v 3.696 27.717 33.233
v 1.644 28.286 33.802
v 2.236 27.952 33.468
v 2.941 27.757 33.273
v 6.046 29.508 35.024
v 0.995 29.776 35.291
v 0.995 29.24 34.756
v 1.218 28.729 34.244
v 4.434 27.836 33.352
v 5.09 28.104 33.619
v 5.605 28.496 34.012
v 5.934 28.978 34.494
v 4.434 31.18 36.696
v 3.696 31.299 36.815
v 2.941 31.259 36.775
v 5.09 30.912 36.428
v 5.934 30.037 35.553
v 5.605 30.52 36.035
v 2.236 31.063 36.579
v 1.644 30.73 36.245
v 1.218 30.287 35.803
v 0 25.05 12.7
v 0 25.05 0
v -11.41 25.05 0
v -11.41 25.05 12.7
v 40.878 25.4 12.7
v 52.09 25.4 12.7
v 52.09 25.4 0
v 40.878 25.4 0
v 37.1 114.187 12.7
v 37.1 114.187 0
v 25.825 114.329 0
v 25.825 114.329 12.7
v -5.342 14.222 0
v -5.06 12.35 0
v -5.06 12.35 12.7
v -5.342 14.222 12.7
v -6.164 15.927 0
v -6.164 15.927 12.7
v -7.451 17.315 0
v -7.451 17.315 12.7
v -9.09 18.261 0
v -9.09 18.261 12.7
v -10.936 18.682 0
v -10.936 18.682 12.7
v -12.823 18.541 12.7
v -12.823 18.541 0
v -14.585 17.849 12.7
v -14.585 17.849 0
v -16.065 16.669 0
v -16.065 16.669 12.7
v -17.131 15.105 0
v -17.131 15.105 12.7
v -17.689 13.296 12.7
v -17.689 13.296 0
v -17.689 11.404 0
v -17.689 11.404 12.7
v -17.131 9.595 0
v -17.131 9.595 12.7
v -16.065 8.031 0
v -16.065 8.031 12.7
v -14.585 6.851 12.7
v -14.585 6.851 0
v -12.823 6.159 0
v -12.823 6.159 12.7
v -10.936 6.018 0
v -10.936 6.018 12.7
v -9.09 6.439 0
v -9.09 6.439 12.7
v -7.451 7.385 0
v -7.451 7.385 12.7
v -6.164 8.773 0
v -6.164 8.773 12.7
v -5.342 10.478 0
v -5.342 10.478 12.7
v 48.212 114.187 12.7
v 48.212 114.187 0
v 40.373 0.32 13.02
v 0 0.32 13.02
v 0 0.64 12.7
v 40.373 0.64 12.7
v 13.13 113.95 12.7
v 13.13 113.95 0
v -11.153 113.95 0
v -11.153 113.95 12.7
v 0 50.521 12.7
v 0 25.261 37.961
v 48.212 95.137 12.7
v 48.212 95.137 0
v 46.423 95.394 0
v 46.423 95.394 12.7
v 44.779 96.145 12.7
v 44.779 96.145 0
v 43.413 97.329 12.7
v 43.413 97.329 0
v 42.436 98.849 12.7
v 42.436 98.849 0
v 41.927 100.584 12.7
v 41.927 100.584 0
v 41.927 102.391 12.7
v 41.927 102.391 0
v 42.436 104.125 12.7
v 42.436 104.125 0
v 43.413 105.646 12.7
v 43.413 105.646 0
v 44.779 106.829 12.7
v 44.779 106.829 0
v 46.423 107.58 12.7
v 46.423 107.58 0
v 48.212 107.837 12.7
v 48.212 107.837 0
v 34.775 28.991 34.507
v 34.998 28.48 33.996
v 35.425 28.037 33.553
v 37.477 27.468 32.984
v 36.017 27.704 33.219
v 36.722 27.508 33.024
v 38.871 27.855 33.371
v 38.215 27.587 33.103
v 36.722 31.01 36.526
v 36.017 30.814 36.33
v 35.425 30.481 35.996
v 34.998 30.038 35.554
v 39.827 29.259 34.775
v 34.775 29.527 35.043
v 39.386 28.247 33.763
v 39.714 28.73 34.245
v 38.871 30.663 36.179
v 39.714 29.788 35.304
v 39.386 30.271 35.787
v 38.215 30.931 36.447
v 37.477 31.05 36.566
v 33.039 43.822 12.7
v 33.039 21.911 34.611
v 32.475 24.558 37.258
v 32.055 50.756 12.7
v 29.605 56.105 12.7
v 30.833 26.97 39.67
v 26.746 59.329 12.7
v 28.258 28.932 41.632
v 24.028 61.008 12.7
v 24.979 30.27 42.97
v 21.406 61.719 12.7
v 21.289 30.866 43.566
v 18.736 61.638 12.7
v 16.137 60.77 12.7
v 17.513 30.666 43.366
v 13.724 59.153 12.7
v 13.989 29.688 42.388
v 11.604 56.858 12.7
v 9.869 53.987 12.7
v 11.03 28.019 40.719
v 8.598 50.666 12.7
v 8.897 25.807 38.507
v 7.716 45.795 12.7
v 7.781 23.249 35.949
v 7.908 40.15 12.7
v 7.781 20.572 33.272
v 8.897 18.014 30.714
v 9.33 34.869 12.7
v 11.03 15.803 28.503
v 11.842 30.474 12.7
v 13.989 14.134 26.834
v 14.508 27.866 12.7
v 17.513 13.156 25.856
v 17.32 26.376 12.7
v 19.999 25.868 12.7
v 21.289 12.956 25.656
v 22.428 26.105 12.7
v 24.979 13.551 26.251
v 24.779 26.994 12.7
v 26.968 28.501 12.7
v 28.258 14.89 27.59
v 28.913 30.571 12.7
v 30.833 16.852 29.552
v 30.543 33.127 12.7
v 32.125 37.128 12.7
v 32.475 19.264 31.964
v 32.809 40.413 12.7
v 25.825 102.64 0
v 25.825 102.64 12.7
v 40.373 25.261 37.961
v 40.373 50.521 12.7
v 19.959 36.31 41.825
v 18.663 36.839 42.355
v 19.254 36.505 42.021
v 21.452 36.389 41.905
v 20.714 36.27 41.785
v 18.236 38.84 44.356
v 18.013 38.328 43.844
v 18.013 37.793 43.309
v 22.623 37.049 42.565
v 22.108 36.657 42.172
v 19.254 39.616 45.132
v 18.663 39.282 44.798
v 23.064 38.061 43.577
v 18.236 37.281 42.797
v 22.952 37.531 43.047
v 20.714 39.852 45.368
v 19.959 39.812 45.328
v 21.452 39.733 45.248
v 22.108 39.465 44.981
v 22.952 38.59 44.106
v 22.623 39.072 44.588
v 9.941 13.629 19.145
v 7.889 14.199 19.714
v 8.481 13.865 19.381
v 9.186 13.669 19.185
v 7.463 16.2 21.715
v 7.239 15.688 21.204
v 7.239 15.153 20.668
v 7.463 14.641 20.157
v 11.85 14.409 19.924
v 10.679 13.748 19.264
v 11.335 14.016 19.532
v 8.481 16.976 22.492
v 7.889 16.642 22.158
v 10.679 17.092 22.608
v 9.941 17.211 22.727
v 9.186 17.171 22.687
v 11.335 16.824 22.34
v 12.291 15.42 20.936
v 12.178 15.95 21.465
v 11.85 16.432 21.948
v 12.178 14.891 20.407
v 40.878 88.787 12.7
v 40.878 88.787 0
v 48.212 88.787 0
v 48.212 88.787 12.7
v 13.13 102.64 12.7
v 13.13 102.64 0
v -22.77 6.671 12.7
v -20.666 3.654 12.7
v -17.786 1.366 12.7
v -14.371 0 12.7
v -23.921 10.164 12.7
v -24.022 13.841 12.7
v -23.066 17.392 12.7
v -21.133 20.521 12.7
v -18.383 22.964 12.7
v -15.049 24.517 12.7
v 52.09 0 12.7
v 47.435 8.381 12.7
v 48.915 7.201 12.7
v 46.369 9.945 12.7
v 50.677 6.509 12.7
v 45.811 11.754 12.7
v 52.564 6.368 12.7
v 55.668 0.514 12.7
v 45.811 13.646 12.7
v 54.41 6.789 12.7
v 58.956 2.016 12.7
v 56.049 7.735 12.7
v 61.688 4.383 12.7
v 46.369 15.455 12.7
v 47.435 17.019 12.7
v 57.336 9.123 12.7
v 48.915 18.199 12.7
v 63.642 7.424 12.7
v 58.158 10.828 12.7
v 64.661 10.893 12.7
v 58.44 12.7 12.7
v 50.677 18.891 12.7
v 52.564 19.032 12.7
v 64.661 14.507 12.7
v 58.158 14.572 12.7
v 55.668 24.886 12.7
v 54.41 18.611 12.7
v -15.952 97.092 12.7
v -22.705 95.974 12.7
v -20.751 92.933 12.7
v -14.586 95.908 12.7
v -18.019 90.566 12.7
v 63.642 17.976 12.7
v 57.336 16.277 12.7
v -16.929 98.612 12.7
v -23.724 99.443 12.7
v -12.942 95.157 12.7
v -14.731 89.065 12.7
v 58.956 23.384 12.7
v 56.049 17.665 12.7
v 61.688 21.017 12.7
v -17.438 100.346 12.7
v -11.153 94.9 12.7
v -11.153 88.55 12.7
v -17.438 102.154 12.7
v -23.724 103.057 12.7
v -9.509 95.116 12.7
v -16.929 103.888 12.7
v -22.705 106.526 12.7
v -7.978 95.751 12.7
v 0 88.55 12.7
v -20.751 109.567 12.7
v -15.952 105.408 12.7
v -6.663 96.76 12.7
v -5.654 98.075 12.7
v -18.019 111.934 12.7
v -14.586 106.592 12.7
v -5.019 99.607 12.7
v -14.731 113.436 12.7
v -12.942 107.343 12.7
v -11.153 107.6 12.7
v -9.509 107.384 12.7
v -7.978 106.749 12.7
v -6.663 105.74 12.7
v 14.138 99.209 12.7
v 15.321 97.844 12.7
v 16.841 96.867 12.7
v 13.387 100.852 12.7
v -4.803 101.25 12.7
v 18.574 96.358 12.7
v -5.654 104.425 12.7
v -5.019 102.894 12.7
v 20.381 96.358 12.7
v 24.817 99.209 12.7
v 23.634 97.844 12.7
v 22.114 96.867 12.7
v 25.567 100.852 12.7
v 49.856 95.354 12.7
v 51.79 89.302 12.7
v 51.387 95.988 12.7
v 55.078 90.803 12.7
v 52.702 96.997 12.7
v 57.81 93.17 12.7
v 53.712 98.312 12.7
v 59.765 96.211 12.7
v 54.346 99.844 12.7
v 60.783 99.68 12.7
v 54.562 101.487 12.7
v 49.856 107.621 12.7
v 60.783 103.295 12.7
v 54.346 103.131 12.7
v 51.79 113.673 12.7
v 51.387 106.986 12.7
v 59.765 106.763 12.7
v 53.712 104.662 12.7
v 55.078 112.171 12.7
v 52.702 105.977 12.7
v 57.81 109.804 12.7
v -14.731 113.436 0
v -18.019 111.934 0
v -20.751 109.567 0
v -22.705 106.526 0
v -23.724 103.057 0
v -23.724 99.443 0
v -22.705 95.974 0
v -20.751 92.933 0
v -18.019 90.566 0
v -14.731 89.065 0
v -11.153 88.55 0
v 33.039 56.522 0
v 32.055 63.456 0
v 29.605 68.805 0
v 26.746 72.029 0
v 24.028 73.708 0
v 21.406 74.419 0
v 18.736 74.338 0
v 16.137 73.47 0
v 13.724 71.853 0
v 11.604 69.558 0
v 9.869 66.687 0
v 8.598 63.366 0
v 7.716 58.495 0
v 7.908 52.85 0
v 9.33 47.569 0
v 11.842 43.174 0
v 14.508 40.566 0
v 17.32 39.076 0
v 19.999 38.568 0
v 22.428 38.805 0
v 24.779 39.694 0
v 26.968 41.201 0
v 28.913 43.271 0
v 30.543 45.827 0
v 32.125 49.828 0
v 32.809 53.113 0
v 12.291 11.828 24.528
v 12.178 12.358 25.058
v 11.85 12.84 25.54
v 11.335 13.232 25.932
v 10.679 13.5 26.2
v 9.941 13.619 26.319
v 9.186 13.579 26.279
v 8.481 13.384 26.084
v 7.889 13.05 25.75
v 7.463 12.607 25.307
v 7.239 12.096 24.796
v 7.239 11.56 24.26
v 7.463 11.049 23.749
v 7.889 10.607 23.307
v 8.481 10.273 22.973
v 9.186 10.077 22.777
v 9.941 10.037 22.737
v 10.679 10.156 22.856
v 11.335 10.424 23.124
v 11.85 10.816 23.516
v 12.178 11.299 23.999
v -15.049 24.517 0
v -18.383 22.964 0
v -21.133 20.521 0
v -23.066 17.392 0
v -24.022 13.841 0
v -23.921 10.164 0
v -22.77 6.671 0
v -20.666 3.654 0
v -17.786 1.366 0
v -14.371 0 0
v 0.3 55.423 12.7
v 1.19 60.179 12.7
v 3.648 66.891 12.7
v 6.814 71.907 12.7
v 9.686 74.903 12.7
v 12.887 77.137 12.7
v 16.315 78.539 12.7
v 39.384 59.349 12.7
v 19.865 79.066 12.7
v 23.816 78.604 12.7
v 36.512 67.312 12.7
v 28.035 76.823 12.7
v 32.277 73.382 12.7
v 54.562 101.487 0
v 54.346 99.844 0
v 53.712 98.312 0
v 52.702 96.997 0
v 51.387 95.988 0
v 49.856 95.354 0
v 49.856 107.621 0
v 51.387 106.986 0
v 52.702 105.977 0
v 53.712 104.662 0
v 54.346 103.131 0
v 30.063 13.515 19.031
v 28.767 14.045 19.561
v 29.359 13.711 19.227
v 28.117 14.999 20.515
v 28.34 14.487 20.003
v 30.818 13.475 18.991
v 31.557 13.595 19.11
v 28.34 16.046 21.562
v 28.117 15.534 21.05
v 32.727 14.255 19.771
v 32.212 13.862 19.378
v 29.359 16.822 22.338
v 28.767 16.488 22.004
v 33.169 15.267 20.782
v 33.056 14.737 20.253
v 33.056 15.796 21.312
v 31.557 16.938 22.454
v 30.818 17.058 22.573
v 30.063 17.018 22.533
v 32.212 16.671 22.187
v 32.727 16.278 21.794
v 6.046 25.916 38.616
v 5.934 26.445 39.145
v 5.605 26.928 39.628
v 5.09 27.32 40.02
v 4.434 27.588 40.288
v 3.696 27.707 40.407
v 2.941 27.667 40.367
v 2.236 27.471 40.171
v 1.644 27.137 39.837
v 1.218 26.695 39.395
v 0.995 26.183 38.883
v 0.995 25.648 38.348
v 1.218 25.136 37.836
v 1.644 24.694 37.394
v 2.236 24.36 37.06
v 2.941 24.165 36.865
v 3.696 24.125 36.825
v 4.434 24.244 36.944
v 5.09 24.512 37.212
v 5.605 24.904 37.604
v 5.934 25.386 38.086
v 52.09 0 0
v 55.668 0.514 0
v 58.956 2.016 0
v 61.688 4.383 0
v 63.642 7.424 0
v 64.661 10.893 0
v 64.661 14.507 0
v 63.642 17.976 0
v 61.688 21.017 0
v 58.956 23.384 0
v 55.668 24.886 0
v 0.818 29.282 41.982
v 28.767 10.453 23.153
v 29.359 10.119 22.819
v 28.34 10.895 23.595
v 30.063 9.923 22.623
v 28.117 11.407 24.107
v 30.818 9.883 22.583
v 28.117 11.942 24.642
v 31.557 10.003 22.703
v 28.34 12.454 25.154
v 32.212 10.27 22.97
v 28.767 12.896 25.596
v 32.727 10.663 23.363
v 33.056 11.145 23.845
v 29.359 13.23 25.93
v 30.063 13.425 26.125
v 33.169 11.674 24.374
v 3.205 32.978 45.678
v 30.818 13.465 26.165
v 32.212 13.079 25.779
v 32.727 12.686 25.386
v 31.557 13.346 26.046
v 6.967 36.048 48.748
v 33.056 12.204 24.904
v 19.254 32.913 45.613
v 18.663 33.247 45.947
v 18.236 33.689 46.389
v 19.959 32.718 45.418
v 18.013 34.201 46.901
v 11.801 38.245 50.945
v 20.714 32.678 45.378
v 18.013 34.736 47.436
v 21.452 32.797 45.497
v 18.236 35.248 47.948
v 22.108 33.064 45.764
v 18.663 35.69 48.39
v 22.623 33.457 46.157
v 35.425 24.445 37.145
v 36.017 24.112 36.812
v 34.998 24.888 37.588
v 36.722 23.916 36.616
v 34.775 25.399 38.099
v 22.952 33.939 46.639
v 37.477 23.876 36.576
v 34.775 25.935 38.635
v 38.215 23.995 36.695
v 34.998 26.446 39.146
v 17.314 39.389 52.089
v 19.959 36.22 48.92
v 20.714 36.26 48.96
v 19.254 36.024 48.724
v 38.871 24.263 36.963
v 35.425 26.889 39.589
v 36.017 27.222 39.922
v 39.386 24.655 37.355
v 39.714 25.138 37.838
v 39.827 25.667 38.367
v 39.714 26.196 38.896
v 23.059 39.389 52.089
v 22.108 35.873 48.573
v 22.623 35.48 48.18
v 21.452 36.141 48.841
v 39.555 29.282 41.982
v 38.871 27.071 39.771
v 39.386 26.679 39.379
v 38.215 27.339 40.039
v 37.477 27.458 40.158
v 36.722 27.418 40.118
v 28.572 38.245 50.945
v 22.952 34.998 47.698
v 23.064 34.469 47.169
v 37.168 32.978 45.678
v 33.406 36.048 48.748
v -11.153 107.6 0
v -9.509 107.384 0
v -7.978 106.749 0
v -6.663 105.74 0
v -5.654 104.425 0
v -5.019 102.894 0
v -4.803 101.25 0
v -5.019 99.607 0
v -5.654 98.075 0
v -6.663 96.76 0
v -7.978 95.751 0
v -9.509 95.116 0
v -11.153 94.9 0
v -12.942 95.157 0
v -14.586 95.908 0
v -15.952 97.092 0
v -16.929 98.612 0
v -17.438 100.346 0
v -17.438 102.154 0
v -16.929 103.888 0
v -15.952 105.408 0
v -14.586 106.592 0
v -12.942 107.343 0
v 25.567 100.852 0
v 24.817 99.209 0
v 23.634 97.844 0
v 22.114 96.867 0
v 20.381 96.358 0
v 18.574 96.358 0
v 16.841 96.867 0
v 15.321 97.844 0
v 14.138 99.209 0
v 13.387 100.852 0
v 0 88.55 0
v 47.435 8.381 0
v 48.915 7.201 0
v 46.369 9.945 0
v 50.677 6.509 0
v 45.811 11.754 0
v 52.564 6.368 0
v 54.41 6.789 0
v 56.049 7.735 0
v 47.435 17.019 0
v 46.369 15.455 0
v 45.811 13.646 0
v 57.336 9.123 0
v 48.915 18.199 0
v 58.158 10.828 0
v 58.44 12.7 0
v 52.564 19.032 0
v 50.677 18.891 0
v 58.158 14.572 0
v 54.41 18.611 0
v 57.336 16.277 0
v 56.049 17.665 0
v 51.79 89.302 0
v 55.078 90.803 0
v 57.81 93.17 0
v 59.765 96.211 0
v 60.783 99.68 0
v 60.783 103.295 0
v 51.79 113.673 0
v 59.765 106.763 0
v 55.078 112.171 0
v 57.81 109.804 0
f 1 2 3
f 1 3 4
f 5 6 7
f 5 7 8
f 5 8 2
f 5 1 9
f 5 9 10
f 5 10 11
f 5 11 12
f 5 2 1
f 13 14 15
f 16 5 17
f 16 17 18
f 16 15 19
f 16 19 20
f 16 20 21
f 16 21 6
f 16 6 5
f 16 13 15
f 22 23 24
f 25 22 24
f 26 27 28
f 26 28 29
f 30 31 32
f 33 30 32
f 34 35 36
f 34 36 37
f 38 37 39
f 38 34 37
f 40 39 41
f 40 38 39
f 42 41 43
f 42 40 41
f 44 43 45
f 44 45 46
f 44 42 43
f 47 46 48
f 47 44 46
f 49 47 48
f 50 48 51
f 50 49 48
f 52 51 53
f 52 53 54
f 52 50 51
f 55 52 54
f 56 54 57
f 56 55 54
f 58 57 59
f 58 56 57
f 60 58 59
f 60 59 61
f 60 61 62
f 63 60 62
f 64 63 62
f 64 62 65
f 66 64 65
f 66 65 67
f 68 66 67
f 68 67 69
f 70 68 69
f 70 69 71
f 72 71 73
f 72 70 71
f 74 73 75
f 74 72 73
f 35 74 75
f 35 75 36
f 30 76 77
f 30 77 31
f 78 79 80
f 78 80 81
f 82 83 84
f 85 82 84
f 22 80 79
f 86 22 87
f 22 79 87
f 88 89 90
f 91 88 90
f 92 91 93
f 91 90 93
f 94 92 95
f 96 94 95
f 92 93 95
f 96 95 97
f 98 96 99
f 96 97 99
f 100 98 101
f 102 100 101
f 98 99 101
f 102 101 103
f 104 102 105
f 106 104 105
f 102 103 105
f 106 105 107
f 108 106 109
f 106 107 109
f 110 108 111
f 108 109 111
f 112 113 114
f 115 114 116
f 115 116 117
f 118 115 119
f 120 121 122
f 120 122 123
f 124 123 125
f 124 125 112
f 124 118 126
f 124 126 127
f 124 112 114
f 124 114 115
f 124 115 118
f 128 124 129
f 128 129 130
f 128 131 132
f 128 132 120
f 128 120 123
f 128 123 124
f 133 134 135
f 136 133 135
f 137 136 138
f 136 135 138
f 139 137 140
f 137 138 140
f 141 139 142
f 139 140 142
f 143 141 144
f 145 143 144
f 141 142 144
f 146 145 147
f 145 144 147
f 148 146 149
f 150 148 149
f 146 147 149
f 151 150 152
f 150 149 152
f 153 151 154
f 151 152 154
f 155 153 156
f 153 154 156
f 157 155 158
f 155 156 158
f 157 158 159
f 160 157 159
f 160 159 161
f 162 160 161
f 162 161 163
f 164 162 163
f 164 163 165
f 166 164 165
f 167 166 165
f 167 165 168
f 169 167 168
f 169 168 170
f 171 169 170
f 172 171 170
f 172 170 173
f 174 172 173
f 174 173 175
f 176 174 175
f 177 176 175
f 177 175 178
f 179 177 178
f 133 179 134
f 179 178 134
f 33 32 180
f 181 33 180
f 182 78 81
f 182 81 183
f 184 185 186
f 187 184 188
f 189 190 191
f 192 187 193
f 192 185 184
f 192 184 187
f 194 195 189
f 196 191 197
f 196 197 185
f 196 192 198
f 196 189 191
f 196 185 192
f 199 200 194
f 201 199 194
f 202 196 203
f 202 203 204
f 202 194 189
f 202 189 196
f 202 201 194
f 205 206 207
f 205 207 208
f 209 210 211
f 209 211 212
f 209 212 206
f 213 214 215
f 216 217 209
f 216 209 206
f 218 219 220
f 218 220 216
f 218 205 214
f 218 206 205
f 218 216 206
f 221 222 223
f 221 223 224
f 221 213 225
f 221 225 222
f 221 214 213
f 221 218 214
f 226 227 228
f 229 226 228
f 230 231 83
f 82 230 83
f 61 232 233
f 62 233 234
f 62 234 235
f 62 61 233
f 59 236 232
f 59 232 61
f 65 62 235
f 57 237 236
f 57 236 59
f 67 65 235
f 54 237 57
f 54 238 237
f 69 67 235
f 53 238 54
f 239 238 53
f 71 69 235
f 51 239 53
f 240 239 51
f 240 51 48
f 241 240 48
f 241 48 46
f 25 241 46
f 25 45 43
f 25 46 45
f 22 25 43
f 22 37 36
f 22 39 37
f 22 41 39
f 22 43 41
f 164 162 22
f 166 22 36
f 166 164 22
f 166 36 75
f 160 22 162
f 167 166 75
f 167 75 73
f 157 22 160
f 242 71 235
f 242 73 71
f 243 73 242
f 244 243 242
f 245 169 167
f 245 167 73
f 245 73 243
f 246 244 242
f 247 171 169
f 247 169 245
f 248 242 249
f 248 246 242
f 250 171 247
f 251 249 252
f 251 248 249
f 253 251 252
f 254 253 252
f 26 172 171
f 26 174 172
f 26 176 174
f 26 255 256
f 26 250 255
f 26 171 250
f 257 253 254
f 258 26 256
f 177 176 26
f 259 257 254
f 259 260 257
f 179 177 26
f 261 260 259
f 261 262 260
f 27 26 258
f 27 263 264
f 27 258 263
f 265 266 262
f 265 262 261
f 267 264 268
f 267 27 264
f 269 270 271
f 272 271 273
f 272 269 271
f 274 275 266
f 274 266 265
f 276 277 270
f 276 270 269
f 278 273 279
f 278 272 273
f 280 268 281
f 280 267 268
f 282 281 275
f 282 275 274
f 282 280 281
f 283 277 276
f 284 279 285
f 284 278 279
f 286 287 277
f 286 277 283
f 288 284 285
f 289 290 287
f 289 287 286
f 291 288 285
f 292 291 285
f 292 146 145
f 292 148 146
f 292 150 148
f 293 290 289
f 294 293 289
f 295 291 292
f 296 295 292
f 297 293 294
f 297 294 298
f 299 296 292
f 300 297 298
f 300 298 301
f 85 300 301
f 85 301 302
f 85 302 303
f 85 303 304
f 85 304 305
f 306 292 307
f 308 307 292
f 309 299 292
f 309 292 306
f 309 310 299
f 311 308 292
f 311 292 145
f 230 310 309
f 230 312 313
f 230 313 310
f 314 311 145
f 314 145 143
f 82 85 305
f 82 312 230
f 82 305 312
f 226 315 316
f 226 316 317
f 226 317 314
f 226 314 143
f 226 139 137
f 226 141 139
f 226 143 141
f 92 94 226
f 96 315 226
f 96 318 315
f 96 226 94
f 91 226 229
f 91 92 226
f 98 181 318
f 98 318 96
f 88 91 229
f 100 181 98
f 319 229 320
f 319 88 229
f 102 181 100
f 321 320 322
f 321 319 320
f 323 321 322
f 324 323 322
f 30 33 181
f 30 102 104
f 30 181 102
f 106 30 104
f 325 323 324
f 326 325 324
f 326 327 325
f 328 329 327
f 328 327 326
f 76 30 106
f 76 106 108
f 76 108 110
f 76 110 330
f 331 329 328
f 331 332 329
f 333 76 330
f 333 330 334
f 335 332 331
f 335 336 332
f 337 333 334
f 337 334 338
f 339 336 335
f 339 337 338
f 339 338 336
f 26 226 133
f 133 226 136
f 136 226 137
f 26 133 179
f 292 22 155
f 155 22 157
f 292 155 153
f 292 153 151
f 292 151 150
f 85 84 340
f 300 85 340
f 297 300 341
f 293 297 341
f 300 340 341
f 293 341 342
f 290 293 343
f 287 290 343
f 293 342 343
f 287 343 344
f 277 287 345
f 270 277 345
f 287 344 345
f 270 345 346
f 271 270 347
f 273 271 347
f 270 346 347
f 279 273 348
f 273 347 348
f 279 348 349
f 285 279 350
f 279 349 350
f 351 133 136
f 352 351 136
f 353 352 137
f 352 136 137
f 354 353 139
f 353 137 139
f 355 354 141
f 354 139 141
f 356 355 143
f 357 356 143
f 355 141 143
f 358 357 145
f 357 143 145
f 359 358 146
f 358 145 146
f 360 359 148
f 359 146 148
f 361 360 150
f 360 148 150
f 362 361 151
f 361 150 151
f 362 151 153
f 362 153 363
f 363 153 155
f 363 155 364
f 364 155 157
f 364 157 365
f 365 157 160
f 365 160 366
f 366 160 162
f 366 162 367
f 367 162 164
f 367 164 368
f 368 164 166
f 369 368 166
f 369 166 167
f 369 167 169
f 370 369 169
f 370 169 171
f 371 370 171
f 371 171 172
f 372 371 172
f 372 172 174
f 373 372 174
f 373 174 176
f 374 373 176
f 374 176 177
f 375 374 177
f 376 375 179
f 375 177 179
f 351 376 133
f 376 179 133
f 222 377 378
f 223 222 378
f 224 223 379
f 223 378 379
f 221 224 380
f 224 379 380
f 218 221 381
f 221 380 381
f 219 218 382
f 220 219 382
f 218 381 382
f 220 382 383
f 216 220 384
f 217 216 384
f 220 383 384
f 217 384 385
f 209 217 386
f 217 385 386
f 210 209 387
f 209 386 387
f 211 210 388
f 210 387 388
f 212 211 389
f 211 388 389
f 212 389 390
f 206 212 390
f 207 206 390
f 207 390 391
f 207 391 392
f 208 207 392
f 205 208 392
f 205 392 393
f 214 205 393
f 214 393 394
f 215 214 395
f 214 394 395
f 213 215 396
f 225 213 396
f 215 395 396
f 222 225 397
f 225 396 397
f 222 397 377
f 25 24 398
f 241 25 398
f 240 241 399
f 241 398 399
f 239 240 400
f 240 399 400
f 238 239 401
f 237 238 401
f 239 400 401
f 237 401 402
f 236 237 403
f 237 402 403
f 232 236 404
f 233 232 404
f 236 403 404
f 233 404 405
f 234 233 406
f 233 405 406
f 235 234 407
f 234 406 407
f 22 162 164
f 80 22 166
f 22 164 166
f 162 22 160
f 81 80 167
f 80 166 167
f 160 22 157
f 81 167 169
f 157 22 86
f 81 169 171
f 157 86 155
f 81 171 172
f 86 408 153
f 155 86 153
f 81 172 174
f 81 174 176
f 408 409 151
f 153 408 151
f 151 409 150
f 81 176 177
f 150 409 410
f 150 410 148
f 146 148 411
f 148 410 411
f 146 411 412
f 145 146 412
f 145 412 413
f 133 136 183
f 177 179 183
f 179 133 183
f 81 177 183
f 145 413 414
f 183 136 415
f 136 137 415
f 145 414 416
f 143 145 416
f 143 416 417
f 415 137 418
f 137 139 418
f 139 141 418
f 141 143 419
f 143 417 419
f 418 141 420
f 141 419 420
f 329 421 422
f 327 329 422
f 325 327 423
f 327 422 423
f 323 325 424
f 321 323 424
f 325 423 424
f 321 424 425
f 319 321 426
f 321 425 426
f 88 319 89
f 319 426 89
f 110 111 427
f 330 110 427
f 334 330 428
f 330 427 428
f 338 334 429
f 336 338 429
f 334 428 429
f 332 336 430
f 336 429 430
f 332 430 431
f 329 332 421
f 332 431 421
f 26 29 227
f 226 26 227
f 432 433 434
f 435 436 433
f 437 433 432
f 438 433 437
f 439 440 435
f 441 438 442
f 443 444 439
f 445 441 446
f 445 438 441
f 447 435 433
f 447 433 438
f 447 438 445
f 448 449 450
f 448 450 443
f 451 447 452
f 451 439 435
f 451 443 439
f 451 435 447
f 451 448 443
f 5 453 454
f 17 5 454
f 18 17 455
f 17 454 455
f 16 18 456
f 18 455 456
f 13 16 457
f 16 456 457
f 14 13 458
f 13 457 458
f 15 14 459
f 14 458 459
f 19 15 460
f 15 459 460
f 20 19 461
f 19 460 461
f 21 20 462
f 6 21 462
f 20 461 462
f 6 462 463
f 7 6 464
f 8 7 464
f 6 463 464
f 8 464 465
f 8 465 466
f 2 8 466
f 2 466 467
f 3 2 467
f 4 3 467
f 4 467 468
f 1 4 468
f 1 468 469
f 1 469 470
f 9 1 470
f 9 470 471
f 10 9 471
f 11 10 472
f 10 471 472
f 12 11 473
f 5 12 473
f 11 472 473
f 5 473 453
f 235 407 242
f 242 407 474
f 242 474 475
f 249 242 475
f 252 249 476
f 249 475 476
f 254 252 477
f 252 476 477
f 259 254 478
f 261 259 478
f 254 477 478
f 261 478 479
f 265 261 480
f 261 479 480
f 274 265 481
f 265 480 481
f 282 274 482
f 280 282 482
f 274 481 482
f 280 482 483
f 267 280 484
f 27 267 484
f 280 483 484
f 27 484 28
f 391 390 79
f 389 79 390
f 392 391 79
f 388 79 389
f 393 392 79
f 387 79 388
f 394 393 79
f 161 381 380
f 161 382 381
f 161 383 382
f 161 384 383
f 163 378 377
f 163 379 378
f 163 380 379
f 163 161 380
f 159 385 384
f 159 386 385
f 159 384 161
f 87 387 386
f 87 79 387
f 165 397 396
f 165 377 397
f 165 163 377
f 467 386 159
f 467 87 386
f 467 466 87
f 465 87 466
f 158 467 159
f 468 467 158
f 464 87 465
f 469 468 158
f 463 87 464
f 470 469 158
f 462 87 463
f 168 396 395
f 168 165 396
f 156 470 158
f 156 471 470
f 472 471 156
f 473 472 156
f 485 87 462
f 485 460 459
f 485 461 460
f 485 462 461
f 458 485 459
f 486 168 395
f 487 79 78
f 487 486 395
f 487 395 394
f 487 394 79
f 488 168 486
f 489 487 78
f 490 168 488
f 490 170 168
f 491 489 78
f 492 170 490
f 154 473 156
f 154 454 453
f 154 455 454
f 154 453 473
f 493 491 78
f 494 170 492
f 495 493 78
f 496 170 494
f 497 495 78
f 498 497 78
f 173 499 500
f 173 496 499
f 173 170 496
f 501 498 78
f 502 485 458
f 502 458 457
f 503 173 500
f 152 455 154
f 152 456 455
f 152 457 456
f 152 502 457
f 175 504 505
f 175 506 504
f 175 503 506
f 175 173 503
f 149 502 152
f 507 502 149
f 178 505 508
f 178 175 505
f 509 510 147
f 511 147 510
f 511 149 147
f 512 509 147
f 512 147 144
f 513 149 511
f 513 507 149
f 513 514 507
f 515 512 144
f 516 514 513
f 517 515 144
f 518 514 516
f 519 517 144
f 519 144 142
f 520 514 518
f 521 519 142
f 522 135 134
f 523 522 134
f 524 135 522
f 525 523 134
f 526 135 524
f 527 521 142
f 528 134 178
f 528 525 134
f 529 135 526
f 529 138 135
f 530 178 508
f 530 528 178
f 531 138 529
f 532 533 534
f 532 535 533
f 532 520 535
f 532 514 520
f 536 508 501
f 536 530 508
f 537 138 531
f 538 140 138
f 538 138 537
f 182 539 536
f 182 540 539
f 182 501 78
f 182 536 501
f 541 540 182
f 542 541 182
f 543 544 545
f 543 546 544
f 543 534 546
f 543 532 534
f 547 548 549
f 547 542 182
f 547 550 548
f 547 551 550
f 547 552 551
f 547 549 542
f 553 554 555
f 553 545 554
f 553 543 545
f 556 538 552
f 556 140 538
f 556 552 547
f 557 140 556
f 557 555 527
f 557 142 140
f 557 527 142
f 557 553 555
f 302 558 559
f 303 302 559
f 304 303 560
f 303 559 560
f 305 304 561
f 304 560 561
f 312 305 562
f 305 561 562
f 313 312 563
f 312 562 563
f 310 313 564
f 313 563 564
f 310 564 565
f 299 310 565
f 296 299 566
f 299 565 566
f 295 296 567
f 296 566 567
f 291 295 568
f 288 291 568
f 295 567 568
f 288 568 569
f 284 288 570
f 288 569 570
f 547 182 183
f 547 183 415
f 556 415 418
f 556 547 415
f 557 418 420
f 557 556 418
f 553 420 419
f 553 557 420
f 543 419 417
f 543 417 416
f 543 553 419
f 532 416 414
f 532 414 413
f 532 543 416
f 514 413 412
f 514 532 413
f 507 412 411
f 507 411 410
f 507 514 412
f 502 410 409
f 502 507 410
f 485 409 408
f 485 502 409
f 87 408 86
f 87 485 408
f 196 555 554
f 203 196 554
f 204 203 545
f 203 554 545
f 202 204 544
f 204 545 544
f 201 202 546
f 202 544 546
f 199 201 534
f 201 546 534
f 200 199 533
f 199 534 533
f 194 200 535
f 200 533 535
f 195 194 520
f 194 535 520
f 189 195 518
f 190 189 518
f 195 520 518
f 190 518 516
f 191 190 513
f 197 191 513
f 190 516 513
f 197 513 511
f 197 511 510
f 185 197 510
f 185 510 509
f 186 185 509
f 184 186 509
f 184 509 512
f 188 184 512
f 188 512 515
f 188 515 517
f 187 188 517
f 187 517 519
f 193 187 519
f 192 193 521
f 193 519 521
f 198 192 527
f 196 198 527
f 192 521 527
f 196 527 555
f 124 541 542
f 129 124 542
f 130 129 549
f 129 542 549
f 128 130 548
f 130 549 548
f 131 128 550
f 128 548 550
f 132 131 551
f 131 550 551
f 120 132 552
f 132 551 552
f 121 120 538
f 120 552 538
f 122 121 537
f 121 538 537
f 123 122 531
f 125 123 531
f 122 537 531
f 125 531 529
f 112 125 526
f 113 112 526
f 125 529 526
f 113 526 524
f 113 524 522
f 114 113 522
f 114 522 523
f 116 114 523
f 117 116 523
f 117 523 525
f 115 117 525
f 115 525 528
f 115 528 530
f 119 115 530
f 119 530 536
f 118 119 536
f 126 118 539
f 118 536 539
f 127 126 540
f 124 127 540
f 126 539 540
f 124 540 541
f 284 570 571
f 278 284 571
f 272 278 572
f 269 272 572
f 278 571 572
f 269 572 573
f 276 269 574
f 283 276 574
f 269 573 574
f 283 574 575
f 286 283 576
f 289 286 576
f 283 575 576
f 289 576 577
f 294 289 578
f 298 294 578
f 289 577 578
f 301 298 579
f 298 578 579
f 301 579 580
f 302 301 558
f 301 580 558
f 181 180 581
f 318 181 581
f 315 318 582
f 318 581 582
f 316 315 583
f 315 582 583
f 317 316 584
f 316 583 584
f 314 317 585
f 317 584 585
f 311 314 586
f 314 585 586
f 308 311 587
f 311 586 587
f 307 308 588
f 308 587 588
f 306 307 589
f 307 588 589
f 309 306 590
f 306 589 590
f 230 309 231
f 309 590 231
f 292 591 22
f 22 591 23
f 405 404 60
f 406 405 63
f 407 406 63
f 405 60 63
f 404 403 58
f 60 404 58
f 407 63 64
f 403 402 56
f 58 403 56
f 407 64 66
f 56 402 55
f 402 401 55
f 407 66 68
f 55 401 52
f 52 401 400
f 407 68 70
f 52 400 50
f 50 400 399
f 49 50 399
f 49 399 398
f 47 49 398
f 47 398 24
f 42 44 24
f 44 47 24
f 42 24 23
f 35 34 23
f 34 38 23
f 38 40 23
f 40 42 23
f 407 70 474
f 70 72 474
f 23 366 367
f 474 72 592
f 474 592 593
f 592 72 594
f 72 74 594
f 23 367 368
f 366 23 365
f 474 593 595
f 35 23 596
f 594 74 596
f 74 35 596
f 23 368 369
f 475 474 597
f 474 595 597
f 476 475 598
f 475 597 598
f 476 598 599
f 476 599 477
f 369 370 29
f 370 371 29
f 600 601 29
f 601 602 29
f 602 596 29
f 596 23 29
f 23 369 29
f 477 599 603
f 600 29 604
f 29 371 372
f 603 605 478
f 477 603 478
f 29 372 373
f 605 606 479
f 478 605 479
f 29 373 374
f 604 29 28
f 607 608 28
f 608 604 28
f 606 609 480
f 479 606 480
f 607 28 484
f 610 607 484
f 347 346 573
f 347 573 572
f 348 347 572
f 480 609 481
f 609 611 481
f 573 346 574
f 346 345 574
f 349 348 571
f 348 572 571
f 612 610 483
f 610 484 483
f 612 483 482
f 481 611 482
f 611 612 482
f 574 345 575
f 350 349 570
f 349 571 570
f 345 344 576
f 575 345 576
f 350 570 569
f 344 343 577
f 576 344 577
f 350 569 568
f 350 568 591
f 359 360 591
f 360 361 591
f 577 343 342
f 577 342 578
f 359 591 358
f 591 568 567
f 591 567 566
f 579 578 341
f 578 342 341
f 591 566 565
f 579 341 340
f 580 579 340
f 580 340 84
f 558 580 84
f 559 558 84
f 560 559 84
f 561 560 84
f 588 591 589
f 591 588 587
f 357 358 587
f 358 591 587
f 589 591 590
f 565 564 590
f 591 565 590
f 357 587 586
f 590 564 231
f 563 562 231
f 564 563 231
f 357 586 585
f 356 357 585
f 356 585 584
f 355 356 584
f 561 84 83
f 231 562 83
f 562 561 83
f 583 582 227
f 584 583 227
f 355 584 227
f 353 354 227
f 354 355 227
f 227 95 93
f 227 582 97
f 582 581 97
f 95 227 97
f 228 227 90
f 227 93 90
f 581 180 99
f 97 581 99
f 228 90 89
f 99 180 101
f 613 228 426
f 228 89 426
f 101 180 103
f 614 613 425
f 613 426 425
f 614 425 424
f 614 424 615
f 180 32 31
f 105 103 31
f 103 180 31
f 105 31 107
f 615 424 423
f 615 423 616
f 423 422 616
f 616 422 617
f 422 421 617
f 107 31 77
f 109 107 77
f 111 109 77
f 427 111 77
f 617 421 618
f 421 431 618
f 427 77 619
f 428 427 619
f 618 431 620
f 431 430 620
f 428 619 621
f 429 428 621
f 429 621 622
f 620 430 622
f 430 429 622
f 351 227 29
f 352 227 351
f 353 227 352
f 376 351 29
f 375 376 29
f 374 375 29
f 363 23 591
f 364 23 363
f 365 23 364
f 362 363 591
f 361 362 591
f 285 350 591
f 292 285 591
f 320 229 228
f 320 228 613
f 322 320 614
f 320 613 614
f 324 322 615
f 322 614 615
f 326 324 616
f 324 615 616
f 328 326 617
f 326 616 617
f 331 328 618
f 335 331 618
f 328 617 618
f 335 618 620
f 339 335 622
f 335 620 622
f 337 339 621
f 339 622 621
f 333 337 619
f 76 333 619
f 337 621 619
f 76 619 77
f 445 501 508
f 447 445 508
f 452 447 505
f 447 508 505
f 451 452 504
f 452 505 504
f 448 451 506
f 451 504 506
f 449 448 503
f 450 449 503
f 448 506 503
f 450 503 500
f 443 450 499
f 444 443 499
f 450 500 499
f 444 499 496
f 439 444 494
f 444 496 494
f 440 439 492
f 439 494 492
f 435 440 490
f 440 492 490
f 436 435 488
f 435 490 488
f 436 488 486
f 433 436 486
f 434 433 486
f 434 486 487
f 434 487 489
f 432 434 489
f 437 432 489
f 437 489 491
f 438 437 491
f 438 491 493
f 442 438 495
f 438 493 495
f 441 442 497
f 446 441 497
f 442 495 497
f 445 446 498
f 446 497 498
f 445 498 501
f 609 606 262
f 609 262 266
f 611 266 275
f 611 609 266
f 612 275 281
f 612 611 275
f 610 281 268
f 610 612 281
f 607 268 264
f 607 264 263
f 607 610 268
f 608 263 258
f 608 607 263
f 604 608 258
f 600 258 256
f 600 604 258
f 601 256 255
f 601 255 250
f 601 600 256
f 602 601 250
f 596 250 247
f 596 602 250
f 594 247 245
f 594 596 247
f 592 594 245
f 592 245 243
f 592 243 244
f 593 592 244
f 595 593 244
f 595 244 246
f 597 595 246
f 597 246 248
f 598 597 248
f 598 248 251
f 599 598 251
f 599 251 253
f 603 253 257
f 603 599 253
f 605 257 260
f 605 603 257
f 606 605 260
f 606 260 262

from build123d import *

# Parameters (mm, degrees)
F0_R     = 6.35
F1_DEPTH = 12.7
F3_W     = 40.3730167193
F3_H     = 35.2713091659
F5_R     = 2.54
F7_DEPTH = 5.08
F6_R     = 12.7
F8_DEPTH = 89.8240799379


with BuildPart() as f1:
    # F0 (on Top) → F1 (new body)
    with BuildSketch(Plane.XY):
        with BuildLine():
            Line((0, 25.0500811696), (0, 0))
            Line((0, 0), (40.8781252747, 0))
            Line((40.8781252747, 0), (40.8781252747, 25.4))
            Line((40.8781252747, 25.4), (40.8781252747, 88.7872132744))
            Line((40.8781252747, 88.7872132744), (48.2122819069, 88.7872132744))
            Line((48.2122819069, 88.7872132744), (48.2122819069, 95.1372132744))
            ThreePointArc((48.2122819069, 95.1372132744), (41.8622819069, 101.4872132744), (48.2122819069, 107.8372132744))
            Line((48.2122819069, 107.8372132744), (48.2122819069, 114.1872132744))
            Line((48.2122819069, 114.1872132744), (37.0997800088, 114.1872132744))
            Line((37.0997800088, 114.1872132744), (25.8245790959, 114.3290178623))
            Line((25.8245790959, 114.3290178623), (25.8245790959, 102.6404798031))
            ThreePointArc((25.8245790959, 102.6404798031), (19.4774063595, 96.2933070667), (13.1302336231, 102.6404798031))
            Line((13.1302336231, 102.6404798031), (13.1302336231, 113.9500811696))
            Line((13.1302336231, 113.9500811696), (0, 113.9500811696))
            Line((0, 113.9500811696), (-11.1529994756, 113.9500811696))
            Line((-11.1529994756, 113.9500811696), (-11.1529994756, 107.6000811696))
            ThreePointArc((-11.1529994756, 107.6000811696), (-6.6628714151, 105.7402092301), (-4.8029994756, 101.2500811696))
            ThreePointArc((-4.8029994756, 101.2500811696), (-6.6628714151, 96.7599531091), (-11.1529994756, 94.9000811696))
            Line((-11.1529994756, 94.9000811696), (-11.1529994756, 88.5500811696))
            Line((-11.1529994756, 88.5500811696), (0, 88.5500811696))
            Line((0, 88.5500811696), (0, 25.0500811696))
        make_face()
        with BuildLine():
            Line((-14.3708139776, 0), (0, 0))
            Line((0, 0), (0, 25.0500811696))
            Line((0, 25.0500811696), (-11.4101560939, 25.0500811696))
            ThreePointArc((-11.4101560939, 25.0500811696), (-24.0223730056, 13.8407134425), (-14.3708139776, 0))
        make_face()
        with Locations((-11.4101560939, 12.3500811696)):
            Circle(F0_R, mode=Mode.SUBTRACT)
        with BuildLine():
            Line((40.8781252747, 25.4), (40.8781252747, 0))
            Line((40.8781252747, 0), (52.0898439061, 0))
            ThreePointArc((52.0898439061, 0), (64.7898439061, 12.7), (52.0898439061, 25.4))
            Line((52.0898439061, 25.4), (40.8781252747, 25.4))
        make_face()
        with Locations((52.0898439061, 12.7)):
            Circle(F0_R, mode=Mode.SUBTRACT)
        with BuildLine():
            ThreePointArc((-11.1529994756, 113.9500811696), (-23.8529994756, 101.2500811696), (-11.1529994756, 88.5500811696))
            Line((-11.1529994756, 88.5500811696), (-11.1529994756, 94.9000811696))
            ThreePointArc((-11.1529994756, 94.9000811696), (-17.5029994756, 101.2500811696), (-11.1529994756, 107.6000811696))
            Line((-11.1529994756, 107.6000811696), (-11.1529994756, 113.9500811696))
        make_face()
        with BuildLine():
            Line((48.2122819069, 95.1372132744), (48.2122819069, 88.7872132744))
            ThreePointArc((48.2122819069, 88.7872132744), (60.9122819069, 101.4872132744), (48.2122819069, 114.1872132744))
            Line((48.2122819069, 114.1872132744), (48.2122819069, 107.8372132744))
            ThreePointArc((48.2122819069, 107.8372132744), (52.7024099674, 105.977341335), (54.5622819069, 101.4872132744))
            ThreePointArc((54.5622819069, 101.4872132744), (52.7024099674, 96.9970852139), (48.2122819069, 95.1372132744))
        make_face()
    extrude(amount=F1_DEPTH)


with BuildPart() as f4:
    # F3 (on face) → F4 (new body, up to the next surface of F1)
    with BuildSketch(Plane(origin=(0, -6.35, 6.35), x_dir=(1, 0, 0), z_dir=(0, -0.7071067812, 0.7071067812))):
        with Locations((20.1865083596, 27.0684621477)):
            Rectangle(F3_W, F3_H)
        with BuildLine():
            ThreePointArc((40.3730167193, 44.7041167306), (20.1865083596, 64.8906250903), (0, 44.7041167306))
            Line((0, 44.7041167306), (40.3730167193, 44.7041167306))
        make_face()
    extrude(until=Until.NEXT, target=f1.part, dir=(0, 0.7071067812, -0.7071067812))

    # F5 (on face) → F7 (cut)
    with BuildSketch(Plane(origin=(0, -6.35, 6.35), x_dir=(1, 0, 0), z_dir=(0, -0.7071067812, 0.7071067812))):
        with Locations((20.5244645476, 57.7262341976)):
            Circle(F5_R)
        with Locations((3.5063998094, 45.6306987153)):
            Circle(F5_R)
        with Locations((9.7510664325, 25.7078313312)):
            Circle(F5_R)
        with Locations((30.6285473922, 25.4903576168)):
            Circle(F5_R)
        with Locations((37.2868736017, 45.2788188537)):
            Circle(F5_R)
    extrude(amount=-F7_DEPTH, mode=Mode.SUBTRACT)


with BuildPart() as f8_tool:
    # F6 (on face) → F8 (new body, through all)
    with BuildSketch(Plane(origin=(0, -6.35, 6.35), x_dir=(1, 0, 0), z_dir=(0, -0.7071067812, 0.7071067812))):
        with Locations((20.3394703567, 39.9667881429)):
            Circle(F6_R)
    extrude(amount=-F8_DEPTH)


with BuildPart() as f1_1:
    add(f1.part)

    # F8: cut by f8_tool
    add(f8_tool.part, mode=Mode.SUBTRACT)


with BuildPart() as f4_1:
    add(f4.part)

    # F8: cut by f8_tool
    add(f8_tool.part, mode=Mode.SUBTRACT)


solid = Compound([f1_1.part, f4_1.part])
